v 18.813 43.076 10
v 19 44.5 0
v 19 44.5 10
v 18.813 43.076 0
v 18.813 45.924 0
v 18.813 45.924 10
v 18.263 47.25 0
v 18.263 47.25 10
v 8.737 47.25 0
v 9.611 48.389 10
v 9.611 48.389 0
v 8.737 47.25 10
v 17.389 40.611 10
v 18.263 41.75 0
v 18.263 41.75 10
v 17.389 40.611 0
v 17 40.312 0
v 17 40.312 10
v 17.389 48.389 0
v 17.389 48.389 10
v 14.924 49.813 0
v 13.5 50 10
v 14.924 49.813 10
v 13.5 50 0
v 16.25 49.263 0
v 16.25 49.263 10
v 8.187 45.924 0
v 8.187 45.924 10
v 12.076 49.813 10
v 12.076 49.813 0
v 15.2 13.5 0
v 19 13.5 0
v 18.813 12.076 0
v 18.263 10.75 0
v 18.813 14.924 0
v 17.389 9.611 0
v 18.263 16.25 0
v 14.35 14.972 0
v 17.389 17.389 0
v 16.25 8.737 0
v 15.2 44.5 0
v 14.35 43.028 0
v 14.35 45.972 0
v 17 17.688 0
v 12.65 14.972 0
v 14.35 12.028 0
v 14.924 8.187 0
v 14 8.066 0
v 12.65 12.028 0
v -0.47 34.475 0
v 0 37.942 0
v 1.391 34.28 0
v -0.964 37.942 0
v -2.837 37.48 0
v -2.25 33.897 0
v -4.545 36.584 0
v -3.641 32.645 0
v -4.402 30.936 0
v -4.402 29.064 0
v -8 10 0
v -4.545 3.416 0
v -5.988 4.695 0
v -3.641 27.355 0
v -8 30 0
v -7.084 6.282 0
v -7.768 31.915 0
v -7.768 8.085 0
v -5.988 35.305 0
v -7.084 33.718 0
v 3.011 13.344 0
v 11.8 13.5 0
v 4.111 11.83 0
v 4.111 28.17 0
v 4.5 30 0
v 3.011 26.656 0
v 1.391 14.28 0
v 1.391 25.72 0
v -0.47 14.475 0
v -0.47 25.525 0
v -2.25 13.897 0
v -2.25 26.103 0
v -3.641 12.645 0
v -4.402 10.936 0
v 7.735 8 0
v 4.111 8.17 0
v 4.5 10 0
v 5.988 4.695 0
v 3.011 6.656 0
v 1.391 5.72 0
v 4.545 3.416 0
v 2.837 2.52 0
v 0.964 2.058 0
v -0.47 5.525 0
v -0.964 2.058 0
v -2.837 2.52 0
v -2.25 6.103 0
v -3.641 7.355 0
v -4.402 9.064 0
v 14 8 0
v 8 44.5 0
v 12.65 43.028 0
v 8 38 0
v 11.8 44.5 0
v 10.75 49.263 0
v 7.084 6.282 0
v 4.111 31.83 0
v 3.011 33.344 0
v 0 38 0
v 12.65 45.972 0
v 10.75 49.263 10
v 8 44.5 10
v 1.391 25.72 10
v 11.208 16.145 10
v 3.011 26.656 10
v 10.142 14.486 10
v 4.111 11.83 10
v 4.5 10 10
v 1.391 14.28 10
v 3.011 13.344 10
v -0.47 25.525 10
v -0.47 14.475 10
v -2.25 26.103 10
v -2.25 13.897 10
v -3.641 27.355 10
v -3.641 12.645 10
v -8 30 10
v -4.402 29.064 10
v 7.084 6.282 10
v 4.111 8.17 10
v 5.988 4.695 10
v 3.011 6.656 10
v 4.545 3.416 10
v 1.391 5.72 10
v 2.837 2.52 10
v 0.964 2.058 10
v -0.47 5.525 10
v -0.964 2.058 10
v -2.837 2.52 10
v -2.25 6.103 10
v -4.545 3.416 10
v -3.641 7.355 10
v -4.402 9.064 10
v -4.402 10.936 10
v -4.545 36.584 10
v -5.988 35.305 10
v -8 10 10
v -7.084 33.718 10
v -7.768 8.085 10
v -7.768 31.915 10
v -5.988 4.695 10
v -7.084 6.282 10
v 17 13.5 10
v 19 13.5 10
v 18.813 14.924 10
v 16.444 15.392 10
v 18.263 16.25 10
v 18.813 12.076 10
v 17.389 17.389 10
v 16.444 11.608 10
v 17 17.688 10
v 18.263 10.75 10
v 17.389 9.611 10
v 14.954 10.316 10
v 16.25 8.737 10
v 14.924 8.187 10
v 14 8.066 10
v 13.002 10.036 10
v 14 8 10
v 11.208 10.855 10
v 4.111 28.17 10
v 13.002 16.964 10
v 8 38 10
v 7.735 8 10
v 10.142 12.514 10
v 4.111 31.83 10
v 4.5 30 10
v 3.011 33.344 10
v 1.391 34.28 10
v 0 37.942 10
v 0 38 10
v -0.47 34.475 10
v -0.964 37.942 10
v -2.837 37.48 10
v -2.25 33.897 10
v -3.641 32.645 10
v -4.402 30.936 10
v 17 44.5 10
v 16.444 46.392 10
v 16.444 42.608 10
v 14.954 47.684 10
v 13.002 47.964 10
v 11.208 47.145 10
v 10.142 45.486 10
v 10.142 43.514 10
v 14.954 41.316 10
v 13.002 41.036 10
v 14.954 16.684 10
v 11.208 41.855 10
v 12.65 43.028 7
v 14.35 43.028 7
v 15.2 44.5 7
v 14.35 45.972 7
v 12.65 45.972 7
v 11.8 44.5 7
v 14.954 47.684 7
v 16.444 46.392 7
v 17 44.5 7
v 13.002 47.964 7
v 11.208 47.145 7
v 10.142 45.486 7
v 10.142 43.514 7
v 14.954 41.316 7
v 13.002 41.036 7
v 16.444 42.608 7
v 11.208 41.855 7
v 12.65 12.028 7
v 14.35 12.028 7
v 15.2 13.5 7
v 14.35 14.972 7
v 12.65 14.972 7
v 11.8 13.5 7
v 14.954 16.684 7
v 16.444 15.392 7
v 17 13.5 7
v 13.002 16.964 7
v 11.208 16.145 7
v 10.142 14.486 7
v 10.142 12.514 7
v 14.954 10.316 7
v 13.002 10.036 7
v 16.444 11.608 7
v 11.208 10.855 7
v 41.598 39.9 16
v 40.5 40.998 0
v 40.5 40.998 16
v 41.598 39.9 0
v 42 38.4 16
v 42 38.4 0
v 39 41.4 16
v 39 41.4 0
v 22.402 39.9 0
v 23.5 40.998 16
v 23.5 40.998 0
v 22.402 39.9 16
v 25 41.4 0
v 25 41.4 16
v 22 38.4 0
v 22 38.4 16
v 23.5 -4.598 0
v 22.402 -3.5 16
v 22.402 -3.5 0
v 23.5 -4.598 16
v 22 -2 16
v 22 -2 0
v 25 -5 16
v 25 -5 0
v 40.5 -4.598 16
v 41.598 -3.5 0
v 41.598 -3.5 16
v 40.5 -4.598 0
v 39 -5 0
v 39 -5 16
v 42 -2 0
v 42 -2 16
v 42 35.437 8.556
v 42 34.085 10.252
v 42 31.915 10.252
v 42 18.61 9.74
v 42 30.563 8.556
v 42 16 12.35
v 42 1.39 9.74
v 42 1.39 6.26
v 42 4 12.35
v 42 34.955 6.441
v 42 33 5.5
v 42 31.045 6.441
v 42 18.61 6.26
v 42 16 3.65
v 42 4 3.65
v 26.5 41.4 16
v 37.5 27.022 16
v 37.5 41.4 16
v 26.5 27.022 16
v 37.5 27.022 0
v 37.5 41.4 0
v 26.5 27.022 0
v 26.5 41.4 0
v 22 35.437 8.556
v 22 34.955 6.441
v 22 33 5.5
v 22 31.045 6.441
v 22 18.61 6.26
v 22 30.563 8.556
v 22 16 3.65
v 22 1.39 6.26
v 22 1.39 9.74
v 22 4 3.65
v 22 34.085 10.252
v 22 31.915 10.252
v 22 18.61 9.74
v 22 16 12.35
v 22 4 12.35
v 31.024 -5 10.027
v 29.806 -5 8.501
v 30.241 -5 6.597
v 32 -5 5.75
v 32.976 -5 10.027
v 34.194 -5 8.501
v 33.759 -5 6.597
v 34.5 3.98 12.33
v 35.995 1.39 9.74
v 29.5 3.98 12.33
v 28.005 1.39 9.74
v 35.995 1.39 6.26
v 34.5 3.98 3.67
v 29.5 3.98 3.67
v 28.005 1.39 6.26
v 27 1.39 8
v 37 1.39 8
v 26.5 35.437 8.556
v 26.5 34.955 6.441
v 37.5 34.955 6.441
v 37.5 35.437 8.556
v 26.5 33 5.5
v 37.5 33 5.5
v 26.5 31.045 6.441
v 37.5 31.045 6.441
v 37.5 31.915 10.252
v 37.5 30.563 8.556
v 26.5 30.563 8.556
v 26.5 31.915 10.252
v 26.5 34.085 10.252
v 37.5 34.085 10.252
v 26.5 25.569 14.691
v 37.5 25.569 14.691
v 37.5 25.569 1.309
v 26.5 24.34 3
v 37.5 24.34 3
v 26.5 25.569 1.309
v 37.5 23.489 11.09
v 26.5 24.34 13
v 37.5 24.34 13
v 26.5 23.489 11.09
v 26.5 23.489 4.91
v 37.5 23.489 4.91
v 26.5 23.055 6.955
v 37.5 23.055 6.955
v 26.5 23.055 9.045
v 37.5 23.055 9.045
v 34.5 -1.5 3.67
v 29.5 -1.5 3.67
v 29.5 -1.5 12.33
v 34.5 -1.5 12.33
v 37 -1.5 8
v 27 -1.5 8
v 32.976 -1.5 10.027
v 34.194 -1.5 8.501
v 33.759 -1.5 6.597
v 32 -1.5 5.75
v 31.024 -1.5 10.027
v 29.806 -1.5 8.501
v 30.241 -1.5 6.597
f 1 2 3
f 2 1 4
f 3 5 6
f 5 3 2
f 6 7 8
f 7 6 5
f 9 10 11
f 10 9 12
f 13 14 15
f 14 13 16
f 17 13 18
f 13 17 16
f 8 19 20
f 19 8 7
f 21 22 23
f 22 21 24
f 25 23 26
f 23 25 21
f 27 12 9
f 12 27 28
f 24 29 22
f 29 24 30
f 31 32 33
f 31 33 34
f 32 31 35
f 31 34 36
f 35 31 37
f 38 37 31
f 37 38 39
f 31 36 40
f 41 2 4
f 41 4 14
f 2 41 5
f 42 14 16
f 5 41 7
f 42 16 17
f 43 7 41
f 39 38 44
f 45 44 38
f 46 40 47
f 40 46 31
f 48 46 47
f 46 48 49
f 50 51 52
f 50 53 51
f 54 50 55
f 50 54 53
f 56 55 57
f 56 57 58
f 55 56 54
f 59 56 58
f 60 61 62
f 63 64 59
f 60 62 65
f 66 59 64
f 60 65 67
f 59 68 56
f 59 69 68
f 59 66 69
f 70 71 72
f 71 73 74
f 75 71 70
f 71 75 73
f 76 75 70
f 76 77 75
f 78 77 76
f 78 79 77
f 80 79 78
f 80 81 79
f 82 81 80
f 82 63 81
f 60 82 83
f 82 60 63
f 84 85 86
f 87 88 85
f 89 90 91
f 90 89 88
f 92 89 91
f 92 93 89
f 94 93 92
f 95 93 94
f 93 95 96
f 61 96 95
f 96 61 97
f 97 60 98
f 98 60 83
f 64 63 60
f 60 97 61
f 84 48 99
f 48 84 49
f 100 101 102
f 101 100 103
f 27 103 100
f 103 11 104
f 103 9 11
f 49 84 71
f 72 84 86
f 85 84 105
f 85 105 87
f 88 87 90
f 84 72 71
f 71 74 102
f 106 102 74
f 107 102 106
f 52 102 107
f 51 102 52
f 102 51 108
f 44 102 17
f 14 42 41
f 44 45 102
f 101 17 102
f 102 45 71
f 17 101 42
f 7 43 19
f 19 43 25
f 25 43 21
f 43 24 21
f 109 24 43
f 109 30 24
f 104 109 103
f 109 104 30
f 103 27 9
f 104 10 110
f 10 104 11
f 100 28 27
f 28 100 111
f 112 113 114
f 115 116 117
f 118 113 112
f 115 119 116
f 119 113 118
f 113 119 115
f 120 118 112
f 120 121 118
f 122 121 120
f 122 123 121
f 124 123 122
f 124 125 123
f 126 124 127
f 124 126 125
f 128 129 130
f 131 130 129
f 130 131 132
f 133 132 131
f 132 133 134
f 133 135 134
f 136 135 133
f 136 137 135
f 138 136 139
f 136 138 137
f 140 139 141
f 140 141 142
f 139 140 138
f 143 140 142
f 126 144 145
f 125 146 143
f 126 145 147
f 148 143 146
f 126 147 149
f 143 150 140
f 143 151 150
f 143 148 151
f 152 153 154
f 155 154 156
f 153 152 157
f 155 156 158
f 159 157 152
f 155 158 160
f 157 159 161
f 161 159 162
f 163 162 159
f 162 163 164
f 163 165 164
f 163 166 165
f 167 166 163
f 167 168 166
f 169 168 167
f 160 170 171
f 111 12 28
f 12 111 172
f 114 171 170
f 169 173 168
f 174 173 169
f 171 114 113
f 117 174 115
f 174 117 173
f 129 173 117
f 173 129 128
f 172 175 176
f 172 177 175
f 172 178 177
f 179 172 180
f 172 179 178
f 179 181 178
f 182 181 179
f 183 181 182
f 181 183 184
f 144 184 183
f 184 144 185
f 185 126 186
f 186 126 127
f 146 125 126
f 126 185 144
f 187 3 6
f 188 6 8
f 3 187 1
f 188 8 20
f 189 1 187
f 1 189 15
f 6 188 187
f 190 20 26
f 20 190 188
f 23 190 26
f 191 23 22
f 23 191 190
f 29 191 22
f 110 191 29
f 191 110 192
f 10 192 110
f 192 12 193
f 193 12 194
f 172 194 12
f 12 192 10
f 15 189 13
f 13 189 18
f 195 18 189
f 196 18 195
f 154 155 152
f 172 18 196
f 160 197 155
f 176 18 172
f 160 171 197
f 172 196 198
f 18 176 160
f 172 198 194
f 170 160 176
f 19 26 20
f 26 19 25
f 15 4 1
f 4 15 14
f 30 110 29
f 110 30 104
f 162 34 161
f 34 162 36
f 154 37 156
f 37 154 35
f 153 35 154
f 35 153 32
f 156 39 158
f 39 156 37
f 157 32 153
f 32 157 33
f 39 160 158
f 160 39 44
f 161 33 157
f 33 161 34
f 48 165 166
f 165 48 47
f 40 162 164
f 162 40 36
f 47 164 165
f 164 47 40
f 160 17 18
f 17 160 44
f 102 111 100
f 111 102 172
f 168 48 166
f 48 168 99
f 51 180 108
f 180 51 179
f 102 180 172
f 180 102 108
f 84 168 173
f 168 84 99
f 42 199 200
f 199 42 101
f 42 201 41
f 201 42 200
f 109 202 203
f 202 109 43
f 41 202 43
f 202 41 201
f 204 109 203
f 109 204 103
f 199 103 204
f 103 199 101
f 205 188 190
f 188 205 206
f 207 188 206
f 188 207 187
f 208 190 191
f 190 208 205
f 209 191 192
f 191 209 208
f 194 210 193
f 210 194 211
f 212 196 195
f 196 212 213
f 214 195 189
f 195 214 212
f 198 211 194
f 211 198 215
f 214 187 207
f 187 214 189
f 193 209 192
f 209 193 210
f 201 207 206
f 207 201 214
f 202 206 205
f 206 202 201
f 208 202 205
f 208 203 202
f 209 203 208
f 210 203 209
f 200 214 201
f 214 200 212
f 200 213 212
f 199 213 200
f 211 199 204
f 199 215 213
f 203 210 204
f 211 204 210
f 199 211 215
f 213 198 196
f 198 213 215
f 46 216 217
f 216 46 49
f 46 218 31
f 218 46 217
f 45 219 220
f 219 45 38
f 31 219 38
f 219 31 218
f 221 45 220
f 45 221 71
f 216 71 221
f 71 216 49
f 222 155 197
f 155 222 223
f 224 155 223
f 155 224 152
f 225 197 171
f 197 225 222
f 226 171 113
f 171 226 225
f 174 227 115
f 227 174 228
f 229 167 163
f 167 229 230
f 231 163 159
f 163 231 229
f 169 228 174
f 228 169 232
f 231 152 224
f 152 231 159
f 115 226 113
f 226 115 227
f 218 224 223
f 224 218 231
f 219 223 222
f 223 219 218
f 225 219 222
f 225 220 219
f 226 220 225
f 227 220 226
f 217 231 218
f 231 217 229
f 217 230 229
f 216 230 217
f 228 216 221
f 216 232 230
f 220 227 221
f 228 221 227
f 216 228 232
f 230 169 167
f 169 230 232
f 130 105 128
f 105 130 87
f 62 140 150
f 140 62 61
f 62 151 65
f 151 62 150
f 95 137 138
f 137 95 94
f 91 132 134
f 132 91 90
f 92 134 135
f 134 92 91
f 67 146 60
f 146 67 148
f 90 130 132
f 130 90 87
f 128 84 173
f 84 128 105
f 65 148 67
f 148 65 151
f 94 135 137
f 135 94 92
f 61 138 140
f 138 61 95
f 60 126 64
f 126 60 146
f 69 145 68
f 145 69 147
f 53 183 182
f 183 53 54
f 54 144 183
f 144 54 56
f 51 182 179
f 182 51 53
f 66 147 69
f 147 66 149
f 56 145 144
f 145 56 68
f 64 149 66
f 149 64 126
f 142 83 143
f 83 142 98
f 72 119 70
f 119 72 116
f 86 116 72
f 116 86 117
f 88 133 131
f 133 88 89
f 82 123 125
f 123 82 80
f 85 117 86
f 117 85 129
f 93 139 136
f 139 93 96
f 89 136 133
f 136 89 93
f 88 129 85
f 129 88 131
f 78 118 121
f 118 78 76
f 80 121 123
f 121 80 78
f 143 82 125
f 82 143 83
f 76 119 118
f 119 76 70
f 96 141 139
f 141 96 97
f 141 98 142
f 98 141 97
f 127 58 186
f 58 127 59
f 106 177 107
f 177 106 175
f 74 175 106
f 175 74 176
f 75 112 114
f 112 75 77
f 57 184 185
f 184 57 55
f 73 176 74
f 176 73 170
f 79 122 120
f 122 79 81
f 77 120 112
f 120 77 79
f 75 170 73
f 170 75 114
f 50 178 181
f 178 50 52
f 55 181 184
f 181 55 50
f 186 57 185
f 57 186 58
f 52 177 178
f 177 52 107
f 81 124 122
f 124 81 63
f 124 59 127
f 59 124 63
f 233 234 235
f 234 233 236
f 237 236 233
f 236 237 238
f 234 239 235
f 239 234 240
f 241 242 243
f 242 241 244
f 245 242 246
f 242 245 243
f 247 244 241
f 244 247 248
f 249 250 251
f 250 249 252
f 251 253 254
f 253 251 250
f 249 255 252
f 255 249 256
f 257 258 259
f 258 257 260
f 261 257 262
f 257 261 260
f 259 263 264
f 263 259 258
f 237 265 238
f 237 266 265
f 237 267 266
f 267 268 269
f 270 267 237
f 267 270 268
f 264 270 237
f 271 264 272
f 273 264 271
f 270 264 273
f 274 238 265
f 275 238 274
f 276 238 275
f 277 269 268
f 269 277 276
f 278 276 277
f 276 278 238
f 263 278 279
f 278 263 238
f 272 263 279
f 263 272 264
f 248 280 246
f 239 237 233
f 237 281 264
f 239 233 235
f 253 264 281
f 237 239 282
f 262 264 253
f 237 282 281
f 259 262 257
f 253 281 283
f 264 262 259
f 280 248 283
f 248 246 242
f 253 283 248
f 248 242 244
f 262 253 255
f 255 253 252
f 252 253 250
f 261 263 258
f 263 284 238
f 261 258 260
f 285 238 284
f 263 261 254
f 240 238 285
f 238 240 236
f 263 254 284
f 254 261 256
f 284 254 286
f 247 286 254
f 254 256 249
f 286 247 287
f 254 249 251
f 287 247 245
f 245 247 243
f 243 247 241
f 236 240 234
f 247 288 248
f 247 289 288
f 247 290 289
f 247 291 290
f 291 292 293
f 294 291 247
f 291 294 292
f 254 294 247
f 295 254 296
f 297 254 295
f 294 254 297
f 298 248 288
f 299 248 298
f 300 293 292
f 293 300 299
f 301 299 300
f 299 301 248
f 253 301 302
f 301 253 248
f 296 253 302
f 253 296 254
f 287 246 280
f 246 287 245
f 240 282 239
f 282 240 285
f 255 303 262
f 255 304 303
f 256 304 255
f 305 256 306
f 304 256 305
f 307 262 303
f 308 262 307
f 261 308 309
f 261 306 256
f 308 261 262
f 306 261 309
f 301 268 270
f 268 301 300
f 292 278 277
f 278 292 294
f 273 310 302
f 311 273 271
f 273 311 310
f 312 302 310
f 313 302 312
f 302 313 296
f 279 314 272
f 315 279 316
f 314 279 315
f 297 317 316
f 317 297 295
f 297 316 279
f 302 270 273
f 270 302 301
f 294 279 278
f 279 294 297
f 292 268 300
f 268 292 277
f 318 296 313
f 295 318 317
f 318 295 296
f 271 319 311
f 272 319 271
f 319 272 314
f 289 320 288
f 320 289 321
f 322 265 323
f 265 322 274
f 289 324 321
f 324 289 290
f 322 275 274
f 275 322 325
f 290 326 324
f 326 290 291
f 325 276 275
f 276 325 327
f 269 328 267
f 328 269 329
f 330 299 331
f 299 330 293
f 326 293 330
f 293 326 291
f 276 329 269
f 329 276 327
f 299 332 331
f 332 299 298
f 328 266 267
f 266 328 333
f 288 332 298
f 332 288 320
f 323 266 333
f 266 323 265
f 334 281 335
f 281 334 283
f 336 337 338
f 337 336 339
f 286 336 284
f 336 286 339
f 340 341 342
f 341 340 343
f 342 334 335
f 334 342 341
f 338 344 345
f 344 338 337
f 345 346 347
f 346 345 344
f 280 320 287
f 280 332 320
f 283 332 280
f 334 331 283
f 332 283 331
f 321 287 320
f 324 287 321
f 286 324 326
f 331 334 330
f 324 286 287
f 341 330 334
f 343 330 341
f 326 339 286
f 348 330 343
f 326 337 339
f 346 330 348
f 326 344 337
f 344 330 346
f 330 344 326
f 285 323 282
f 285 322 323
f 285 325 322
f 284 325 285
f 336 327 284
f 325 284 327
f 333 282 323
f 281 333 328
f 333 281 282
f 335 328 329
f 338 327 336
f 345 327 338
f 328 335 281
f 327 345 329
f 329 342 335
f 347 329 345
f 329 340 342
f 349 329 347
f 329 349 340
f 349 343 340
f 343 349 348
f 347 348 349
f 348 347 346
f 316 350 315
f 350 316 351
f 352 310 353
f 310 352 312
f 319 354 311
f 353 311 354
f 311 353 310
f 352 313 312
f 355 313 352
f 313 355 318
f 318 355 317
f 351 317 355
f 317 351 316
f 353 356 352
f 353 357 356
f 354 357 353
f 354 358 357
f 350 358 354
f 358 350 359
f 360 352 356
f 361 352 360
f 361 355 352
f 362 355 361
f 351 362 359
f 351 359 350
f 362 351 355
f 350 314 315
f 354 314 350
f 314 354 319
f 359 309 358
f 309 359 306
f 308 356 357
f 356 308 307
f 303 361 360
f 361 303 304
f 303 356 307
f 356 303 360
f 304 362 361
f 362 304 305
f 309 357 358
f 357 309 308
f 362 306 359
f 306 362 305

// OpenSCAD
// file: inc/functions.scad
// PRUSA iteration3
// Functions used in many files
// GNU GPL v3
// Josef Průša <josefprusa@me.com>
// Václav 'ax' Hůla <axtheb@gmail.com>
// Vlnofka <>
// http://www.reprap.org/wiki/Prusa_Mendel
// http://github.com/prusajr/PrusaMendel


module nut(d,h,horizontal=true){
    cornerdiameter =  (d / 2) / cos (180 / 6);
    cylinder(h = h, r = cornerdiameter, $fn = 6);
    if(horizontal){
        for(i = [1:6]){
            rotate([0,0,60*i]) translate([-cornerdiameter-0.2,0,0]) rotate([0,0,-45]) cube([2,2,h]);
        }
    }
}

// Based on nophead research
module polyhole(d, h, center=false) {
    n = max(round(2 * d),3);
    rotate([0,0,180])
        cylinder(h = h, r = (d / 2) / cos (180 / n), $fn = n);
}

// make it interchangeable between this and cylinder
module cylinder_poly(r, h, center=false){
    polyhole(d=r*2, h=h, center=center);
}

module fillet(radius, height=100, $fn=0) {
    //this creates acutal fillet
    translate([-radius, -radius, -height / 2 - 0.02]) difference() {
        cube([radius * 2, radius * 2, height + 0.04]);
        if ($fn == 0 && (radius == 2 || radius == 3 || radius == 4)) {
            cylinder(r=radius, h=height + 0.04, $fn=4 * radius);
        } else {
            cylinder(r=radius, h=height + 0.04, $fn=$fn);
        }

    }
}

module cube_fillet(size, radius=-1, vertical=[3,3,3,3], top=[0,0,0,0], bottom=[0,0,0,0], center=false, $fn=0){
    //
    if (use_fillets) {
        if (center) {
            cube_fillet_inside(size, radius, vertical, top, bottom, $fn);
        } else {
            translate([size[0]/2, size[1]/2, size[2]/2])
                cube_fillet_inside(size, radius, vertical, top, bottom, $fn);
        }
    } else {
        cube(size, center);
    }

}

module cube_negative_fillet(size, radius=-1, vertical=[3,3,3,3], top=[0,0,0,0], bottom=[0,0,0,0], $fn=0){

    j=[1,0,1,0];

    for (i=[0:3]) {
        if (radius > -1) {
            rotate([0, 0, 90*i]) translate([size[1-j[i]]/2, size[j[i]]/2, 0]) fillet(radius, size[2], $fn=$fn);
        } else {
            rotate([0, 0, 90*i]) translate([size[1-j[i]]/2, size[j[i]]/2, 0]) fillet(vertical[i], size[2], $fn=$fn);
        }
        rotate([90*i, -90, 0]) translate([size[2]/2, size[j[i]]/2, 0 ]) fillet(top[i], size[1-j[i]], $fn=$fn);
        rotate([90*(4-i), 90, 0]) translate([size[2]/2, size[j[i]]/2, 0]) fillet(bottom[i], size[1-j[i]], $fn=$fn);

    }
}

module cube_fillet_inside(size, radius=-1, vertical=[3,3,3,3], top=[0,0,0,0], bottom=[0,0,0,0], $fn=0){
    //makes CENTERED cube with round corners
    // if you give it radius, it will fillet vertical corners.
    //othervise use vertical, top, bottom arrays
    //when viewed from top, it starts in upper right corner (+x,+y quadrant) , goes counterclockwise
    //top/bottom fillet starts in direction of Y axis and goes CCW too


    if (radius == 0) {
        cube(size, center=true);
    } else {
        difference() {
            cube(size, center=true);
            cube_negative_fillet(size, radius, vertical, top, bottom, $fn);
        }
    }
}


module nema17(places=[1,1,1,1], size=15.5, h=10, holes=false, shadow=false, $fn=24){
    for (i=[0:3]) {
        if (places[i] == 1) {
            rotate([0, 0, 90*i]) translate([size, size, 0]) {
                if (holes) {
                    rotate([0, 0, -90*i])  translate([0,0,-10]) screw(r=1.7, slant=false, head_drop=13, $fn=$fn, h=h+12);
                } else {
                    rotate([0, 0, -90*i]) cylinder(h=h, r=5.5, $fn=$fn);
                }
            }
        }
    }
    if (shadow != false) {
        %translate ([0, 0, shadow+21+3]) cube([42,42,42], center = true);
    //flange
        %translate ([0, 0, shadow+21+3-21-1]) cylinder(r=11,h=2, center = true, $fn=20);
    //shaft
        %translate ([0, 0, shadow+21+3-21-7]) cylinder(r=2.5,h=14, center = true);
    }
}

module screw(h=20, r=2, r_head=3.5, head_drop=0, slant=i_am_box, poly=false, $fn=0){
    //makes screw with head
    //for substraction as screw hole
    if (poly) {
        cylinder_poly(h=h, r=r, $fn=$fn);
    } else {
        cylinder(h=h, r=r, $fn=$fn);
    }
    if (slant) {
        translate([0, 0, head_drop-0.01]) cylinder(h=r_head, r2=0, r1=r_head, $fn=$fn);
    }

    if (head_drop > 0) {
        translate([0, 0, -0.01]) cylinder(h=head_drop+0.01, r=r_head, $fn=$fn);
    }
}

//radius of the idler assembly (to surface that touches belt, ignoring guide walls)
function idler_assy_r_inner(idler_bearing) = (idler_bearing[0] / 2) + 4 * single_wall_width * idler_bearing[3];
//radius of the idler assembly (to smooth side of belt)
function idler_assy_r_outer(idler_bearing) = (idler_bearing[0] / 2) + (idler_bearing[3] ? (5.5 * idler_bearing[3]) : 3);


module idler_assy(idler_bearing = [22, 7, 8, 1]) {

    translate([0,0,-1]) cylinder(h = 120, r=(idler_bearing[2] + 1) / 2, $fn=7, center=true);
    //bearing shadow
    %cylinder(h = idler_bearing[1], r=idler_bearing[0]/2, center=true);

    cylinder(h = idler_width + 1, r=idler_assy_r_outer(idler_bearing) + 0.5, center=true);
}

module maketeeth(len){
    //Belt teeth. To be substracted from model
    for (i = [0 : len / belt_tooth_distance]) {
        translate([0, 0, i * belt_tooth_distance]) cube([2, 10, belt_tooth_distance * belt_tooth_ratio], center = true);
    }
}
// file: inc/conf_bushing.scad
// PRUSA iteration3
// Bushing and bering dimensions
// GNU GPL v3
// Václav 'ax' Hůla <axtheb@gmail.com>
// http://www.reprap.org/wiki/Prusa_Mendel
// http://github.com/prusajr/PrusaMendel
//

// each config is in form[r_rod, r, h, type, name] where:
//     r_rod  is smooth rod radius [0]
//     r is outer bushing radius needed for tight fit or bearing radius with loose fit [1]
//     h is barrel length [2]
//     type is 0 for linear bearings, 1 is for bushings which needs to be enclosed fully. [3]
//       type 1 may have flange, but type 0 not
//     name is human readable name [4]

//bushings
conf_b_bushing8 = [4, 5.1, 10, 1, "Tube shaped bushing like igus J(V)FM 0810-10"];
conf_b_bushing10 = [5, 6.1, 10, 1, "Tube shaped bushing with id=10mm, od=12mm and length of at least 10mm, like J(V)FM 1012-10"];
conf_b_bushing12 = [6, 7.1, 15, 1, "Tube shaped bushing with id=12mm, od=14mm and length of at least 15mm, like SF-1 1215"];

conf_b_bronze8 = [4, 8, 11, 1, "bronze self-aligning bushing, 8mm"];

//shorter beaings (two on each Z axis)
conf_b_lm8uu = [4, 7.7, 24, 0, "lm8uu bearing (standard)"];
conf_b_lm10uu = [5, 9.7, 29, 0, "lm10uu bearing (10mm smooth rod)"];
conf_b_lme8uu =[4, 8.2, 25, 0, "lme8uu bearing"];
conf_b_lm12uu = [6, 10.6, 30, 0, "lm12uu bearing (12mm smooth rod)"];

//longer bearings
conf_b_lm8luu = [4, 7.7, 45, 0, "lm8luu bearing (double length)"];
conf_b_lm10luu = [5, 9.7, 55, 0, "lm10luu bearing (10mm smooth rod, long)"];
conf_b_lm12luu = [6, 10.6, 57, 0, "lm12luu bearing (12mm, double length)"];


// Select idler bearing size **************************************************
// [outer_diameter, width, inner_diameter, uses_guide]

// roughly sorted by desirability

// one bearing with guides
// Select by availability, smaller is better.
bearing_623 = [10, 4, 3, 1, "623 bearing"];
bearing_624 = [13, 5, 4, 1, "624 bearing"];
bearing_625 = [16, 5, 5, 1, "625 bearing"];

// two bearings side by side - for use without bearing guides.
// Not recomended anymore
bearing_625_double = [16, 10, 5, 0, "625 bearing x2"];
bearing_624_double = [13, 10, 4, 0, "624 bearing x2"];
bearing_623_double = [10, 8, 3, 0, "623 bearing"];

// 608 [standard skate bearings] with bearing guide
bearing_608 = [22, 7, 8, 1, "608 bearing"];
// 608 bearings with fender washers.
// the belt brushes both against the carriage and the washers.
bearing_608_washers = [22, 10, 8, 0, "608 bearing"];
// file: inc/metric.scad
// PRUSA iteration3
// Default metric sizes
// GNU GPL v3
// Josef Průša <josefprusa@me.com>
// http://www.reprap.org/wiki/Prusa_Mendel
// http://github.com/prusajr/PrusaMendel

// DONT CHANGE THIS FILE! ALTER VALUES IN CONFIGURATION.SCAD INSTEAD

// RODS

threaded_rod_diameter = 8.7;
threaded_rod_diameter_horizontal = 8.7;
smooth_bar_diameter = 8;
smooth_bar_diameter_horizontal = 8.5;

// Nuts and bolts

m8_diameter = 9;
m8_nut_diameter = 14.1;

m4_diameter = 4.5;
m4_nut_diameter = 9;
m4_nut_diameter_horizontal = 10;

m3_diameter = 3.6;
m3_nut_diameter = 5.3;
m3_nut_diameter_horizontal = 6.8;
m3_washer_diameter = 6.9;

// Motors

motor_shaft = 5.5;
// file: inc/bearing-guide.scad
// PRUSA iteration3
// Bearing guide
// GNU GPL v3
// Josef Průša <josefprusa@me.com>
// Václav 'ax' Hůla <axtheb@gmail.com>
// Original design by Greg Frost
// http://www.reprap.org/wiki/Prusa_Mendel
// http://github.com/josefprusa/Prusa3

// ThingDoc entry
/**
 * @description Helps to hold belt aligned on the bearing.
 * @id bearing-guide
 * @name Bearing guide
 * @category Printed
 */

include <../configuration.scad>
include <functions.scad>

//guiding_wall_thickness of guiding wall
guiding_wall_thickness=layer_height * 4;

//width of the 'groove' in guide. 
// Hardcoded as wider belts work imo better without guides
belt_width = 6.5;

height = max(belt_width, idler_bearing[1]) + guiding_wall_thickness;
//How much the guiding wall overlaps the bearing wall (to the center)
wall_descent = 1;

module bearing_guide_inner(){
    //inner (smaller) part of the guide
    difference(){
        cylinder(r=idler_bearing[0] / 2 + single_wall_width * 3, h=height - (max( idler_bearing[1], belt_width) - idler_bearing[1]) / 2);
        translate([0, 0, -1])
            cylinder(r=idler_bearing[0] / 2, h=height + 2);
    }

    difference(){
        union() {
            cylinder(r=idler_assy_r_outer(idler_bearing), h=guiding_wall_thickness);  //guide wall
            cylinder(r=idler_bearing[0] / 2, h=guiding_wall_thickness + (belt_width - idler_bearing[1])/2);  //this centers the guide on bearing
        }
        translate([0,0,-1])
            cylinder(r=idler_bearing[0] / 2 - wall_descent, h=guiding_wall_thickness + 10);
    }
}

module bearing_guide_outer(){
    difference(){
        cylinder(r=idler_bearing[0] / 2 + 6 * single_wall_width + 0.2, h=height);
        translate([0,0,-1])
            cylinder(r=idler_bearing[0] / 2 + single_wall_width * 2 + 0.2, h=height + 2);
    }

    difference(){
        union(){
            cylinder(r=idler_assy_r_outer(idler_bearing), h=guiding_wall_thickness);
            cylinder(r=idler_bearing[0] / 2, h=guiding_wall_thickness + (belt_width - idler_bearing[1])/2);
        }
        translate([0,0,-1])
cylinder(r=idler_bearing[0]/2-wall_descent, h=height + 5);
    }
}

module bearing_assy(){

    bearing_guide_inner();
    translate([idler_assy_r_outer(idler_bearing) * 2 + 2, 0, 0])
        bearing_guide_outer();
}

bearing_assy();
// file: configuration.scad
// PRUSA iteration3
// Configuration file
// GNU GPL v3
// Josef Průša <josefprusa@me.com>
// Václav 'ax' Hůla <axtheb@gmail.com>
// http://www.reprap.org/wiki/Prusa_Mendel
// http://github.com/prusajr/PrusaMendel

include <inc/metric.scad>;
include <inc/conf_bushing.scad>;

// Custom settings here, tailor to your supplies and print settings


// Extruder settings **********************************************************
// Don't forget to set your slicer's extruder settings to match the values you
// enter here.

layer_height = 0.3;
// Width over thickness determines how wide the plastic will be when extruded
// onto the object that is being printed. width_over_thickness is multiplied
// by the layer_height to calculate this width. i.e. If your layer_height is
// set to 0.3 mm and your width_over_thickness is set to 2.2, the resulting
// width will be 0.66 mm.
width_over_thickness = 2.2;

// Select your belt type ******************************************************

//T2.5
//belt_tooth_distance = 2.5;
//belt_tooth_ratio = 0.75;

//T5 (strongly discouraged)
//belt_tooth_distance = 5;
//belt_tooth_ratio = 0.75;

//HTD3
belt_tooth_distance = 3;
belt_tooth_ratio = 0.75;

//MXL
//belt_tooth_distance = 2.032;
//belt_tooth_ratio = 0.64;

//GT2 there is bunch of GT2 belts with different tooth-to-tooth distance
//adjust to your needs
//belt_tooth_distance = 2;
//belt_tooth_ratio = 0.5;

// For T type belts you will probably want 0.8mm or so.
belt_thickness = 1.75;

// Choose bearing/bushing configuration ***************************************
// conf_b_* are in inc/conf_bushing.scad

bushing_xy = conf_b_lm12luu;
bushing_z = conf_b_lm12luu;
// for longer bearings use one shorter in x-carriage to make place for belt attachment
// by default use same as xy
bushing_carriage = conf_b_lm12uu;

// Select idler bearing size **************************************************
// [outer_diameter, width, inner_diameter, uses_guide]
// 608 [standard skate bearings] with bearing guide
bearing_608 = [22, 7, 8, 1];
// 608 bearings with fender washers. Not good at all, the belt brushes against the carriage
bearing_608_washers = [22, 10, 8, 0];
// one 625 with guides
bearing_625 = [16, 5, 5, 1];
// two 625 - for use without bearing guides.
bearing_625_double = [16, 10, 5, 0];

// those two here are really good:
bearing_624_double = [13, 10, 4, 0];
// this one has roughly same diameter as pulley, makes belt parallel so its prettier
bearing_623_double = [10, 8, 3, 0];

idler_bearing = bearing_624_double;

// Select carriage lenght ******************************************************
// 30 for single carriage extruder (two holes with centers 30mm apart)
// 50 for wade or single with fan (three holes, 30-20)
// 80 for full length carriage (four holes, 30-20-30)

carriage_l_base = 80;

// Fillets ********************************************************************
// fillets are rounded corners of boxes. The right engineering term is probably radius
// but cad software calls it fillet.
// mostly cosmetic, except z axis.
// 0 = no fillets
// 1 = fillet
// 2 = chamfer (cut the edges at 45deg. angle)
// Please do put only parts with fillets on sale, other options are not really tested

use_fillets = 1;

// set to 0 for single plate (affects z axis and screws that attach RP parts to frame)
i_am_box = 1;

// if you do your own plate and can move bottom Z screws 5mm up set this to 0 to
// get stronger motor mount. Only for i_am_box = 0
i_want_to_use_single_plate_dxf_and_make_my_z_weaker = 1;


// Radius of long threaded rod on Y frame

// Affects y-axis-corner (both box and single plate)
// and y-axis-bracket (box only)

//Use 5.4 for M10 or 4.4 for M8
y_threaded_rod_long_r = 5.4;


// Thickness of the boards that make the box frame.

// in y-axis-corner it governs the height of the corners by adjusting the
// distance between ground and M10 threaded rod. (both box and single plate)

// For box model, the parts that hold Z smooth rod have one hole from front
// and one from side, and this setting makes sure that the screw from side
// is in the center of the plank.

// Use 12 for single plate
// or 20 if you want to use the Y lm8uu holders 
// (extras/bearing-holder-single-plate-y)
board_thickness = 18;

// Segments of small holes. some poeple claim that a low value makes them easier to print.
small_hole_segments=7;


// END of custom settings *****************************************************


// You are not supposed to change this
board_to_xz_distance = 26;
xaxis_rod_distance = 45;

//calculated from settings
single_wall_width = width_over_thickness * layer_height;

idler_width = (idler_bearing[1] > 7 ? idler_bearing[1] : 7) + 2.5 * idler_bearing[3] ;

//deltas are used to enlarge parts for bigger bearings 
xy_delta = ((bushing_xy[1] <= 7.7) ? 0 : bushing_xy[1] - 7.7) * 0.9;
z_delta = (bushing_z[1] <= 7.7) ? 0 : bushing_z[1] - 7.7;

// CHANGE ONLY THE STUFF YOU KNOW
// IT WILL REPLACE DEFAULT SETTING

// RODS

// threaded_rod_diameter = 0;
// threaded_rod_diameter_horizontal = 0;
// smooth_bar_diameter = 0;
// smooth_bar_diameter_horizontal = 0;

// Nuts and bolts

// m8_diameter = 0;
// m8_nut_diameter = 0;

// m4_diameter = 0;
// m4_nut_diameter = 0;

// m3_diameter = 0;
// m3_nut_diameter = 0;

// Bushing holder

// bushing_core_diameter = smooth_bar_diameter;
// bushing_material_thickness = 0;

///counted stuff
m3_nut_diameter_bigger = ((m3_nut_diameter  / 2) / cos (180 / 6))*2;

// functions
include <inc/functions.scad>

// These constants define the geometry of the complete-printer.scad

//x_smooth_rod_length=325;
//y_smooth_rod_length=405;
//z_smooth_rod_length=235;
bed_x_size=225;
bed_y_size=225;

x_smooth_rod_length=460+board_thickness*2; // 492 for 16mm thickness; 484 for 12mm thickness
y_smooth_rod_length=470;
z_smooth_rod_length=405;
// main file
// PRUSA iteration3
// Y drivetrain (idler and stepper holders)
// GNU GPL v3
// Josef Průša <josefprusa@me.com>
// Václav 'ax' Hůla <axtheb@gmail.com>
// http://www.reprap.org/wiki/Prusa_Mendel
// http://github.com/prusajr/PrusaMendel

include <configuration.scad>
use <inc/bearing-guide.scad>

module motorholder(thickness=10){
    difference(){
        union(){
            // Motor holding part
            translate([29, -21 + 50, 0])
            {
                //#cube([42, 42, 2], center=true);
                difference(){
                    union(){
                        translate([-21 + 4.5, 0, 5]) cube([9, 31, thickness], center=true);
                        nema17([0, 1, 1, 0], thickness=thickness, shadow=false);
                        mirror([0, 0, 1]) translate([0, 0, -10]) nema17([0, 1, 1, 0], thickness=thickness, shadow=7);
                        // Parts joining part
                        translate([-29, -21, 0]) cube([14, 30, thickness]);
                    }
                    // Motor mounting holes
                    translate([0, 0, thickness]) mirror([0, 0, 1]) nema17([0, 1, 1, 0], thickness=thickness, holes=true);
                }
            }

            // Front holding part
            translate([0, 10, 0]) cylinder(h = thickness, r=8);
            translate([0, 20, 5]) cube([16, 20, thickness], center=true);
            translate([0, 30, 0]) cylinder(h = thickness, r=8);
        }
        translate([0, 10, -1]) cylinder(h = 12, r=4.5);
        translate([0, 30, -1]) cylinder(h = 12, r=4.5);
    }
}

module oval(r=4, l=15, h=2){
    intersection() {
        union() {
            translate([l / 2, 0, 0]) cylinder(r=r, h=h, $fn=4);
            translate([-l / 2, 0, 0]) cylinder(r=r, h=h, $fn=4);
            translate([0, 0, h / 2]) cube([l, r * 2, h], center=true);
        }
        translate([0, 0, h / 2]) cube([l + r * 1.2, r * 2, h], center=true);
    }
}


module idlermount(len=42, narrow_len=0, narrow_width=0, rod=threaded_rod_diameter_horizontal / 2, idler_height=16){
    difference(){
        union(){
            //wide part holding bearing
            translate([- (10 + idler_width) / 2, -25 + narrow_len, 0] ) cube_fillet([10 + idler_width, len + idler_bearing[2] * 1.1 - narrow_len, idler_height]);
            //For X there is narrow part inside the x-idler
            if (narrow_len > 0){
                translate([-narrow_width / 2, -25, 0] ) cube_fillet([narrow_width, len + idler_bearing[2], idler_height], vertical=[0, 0, 2, 2]);
                mirror([1, 0, 0]) translate([-narrow_width / 2, narrow_len -25, idler_height / 2 ]) fillet(1.5, idler_height - 0.04, $fn=8);
                translate([-narrow_width / 2, narrow_len -25, idler_height / 2]) fillet(1.5, idler_height - 0.04, $fn=8);
            }
        }
        translate([-12, -10, idler_height / 2]) rotate([90, 0, 90]) oval(r=rod, l=12, h=25);
        //nut
        translate([0, -17, idler_height / 2]) rotate([90, 0, 0]) cylinder(r=m4_nut_diameter_horizontal / 2, h=9, $fn=6, center=true);
        translate([0, -19, idler_height / 2]) rotate([90, 90, 0]) cylinder(r=m4_diameter / 2, h=15, $fn=7, center=true);

            translate([0, len + idler_bearing[2] - 33, idler_height / 2]) {
                rotate([0, 90, 0]) idler_assy(idler_bearing);
                translate([0, 10, 0]) cube([idler_width + 1, 20, idler_height + 2], center=true);
            }

    }
}


motorholder();
translate([32, 20, 0])  idlermount();

if (idler_bearing[3] == 1) {
    translate([0, -12 - idler_bearing[0] / 2, 0]) {
        bearing_guide_inner();
        translate([idler_bearing[0] + 10, 0, 0])
            bearing_guide_outer();
    }
}
